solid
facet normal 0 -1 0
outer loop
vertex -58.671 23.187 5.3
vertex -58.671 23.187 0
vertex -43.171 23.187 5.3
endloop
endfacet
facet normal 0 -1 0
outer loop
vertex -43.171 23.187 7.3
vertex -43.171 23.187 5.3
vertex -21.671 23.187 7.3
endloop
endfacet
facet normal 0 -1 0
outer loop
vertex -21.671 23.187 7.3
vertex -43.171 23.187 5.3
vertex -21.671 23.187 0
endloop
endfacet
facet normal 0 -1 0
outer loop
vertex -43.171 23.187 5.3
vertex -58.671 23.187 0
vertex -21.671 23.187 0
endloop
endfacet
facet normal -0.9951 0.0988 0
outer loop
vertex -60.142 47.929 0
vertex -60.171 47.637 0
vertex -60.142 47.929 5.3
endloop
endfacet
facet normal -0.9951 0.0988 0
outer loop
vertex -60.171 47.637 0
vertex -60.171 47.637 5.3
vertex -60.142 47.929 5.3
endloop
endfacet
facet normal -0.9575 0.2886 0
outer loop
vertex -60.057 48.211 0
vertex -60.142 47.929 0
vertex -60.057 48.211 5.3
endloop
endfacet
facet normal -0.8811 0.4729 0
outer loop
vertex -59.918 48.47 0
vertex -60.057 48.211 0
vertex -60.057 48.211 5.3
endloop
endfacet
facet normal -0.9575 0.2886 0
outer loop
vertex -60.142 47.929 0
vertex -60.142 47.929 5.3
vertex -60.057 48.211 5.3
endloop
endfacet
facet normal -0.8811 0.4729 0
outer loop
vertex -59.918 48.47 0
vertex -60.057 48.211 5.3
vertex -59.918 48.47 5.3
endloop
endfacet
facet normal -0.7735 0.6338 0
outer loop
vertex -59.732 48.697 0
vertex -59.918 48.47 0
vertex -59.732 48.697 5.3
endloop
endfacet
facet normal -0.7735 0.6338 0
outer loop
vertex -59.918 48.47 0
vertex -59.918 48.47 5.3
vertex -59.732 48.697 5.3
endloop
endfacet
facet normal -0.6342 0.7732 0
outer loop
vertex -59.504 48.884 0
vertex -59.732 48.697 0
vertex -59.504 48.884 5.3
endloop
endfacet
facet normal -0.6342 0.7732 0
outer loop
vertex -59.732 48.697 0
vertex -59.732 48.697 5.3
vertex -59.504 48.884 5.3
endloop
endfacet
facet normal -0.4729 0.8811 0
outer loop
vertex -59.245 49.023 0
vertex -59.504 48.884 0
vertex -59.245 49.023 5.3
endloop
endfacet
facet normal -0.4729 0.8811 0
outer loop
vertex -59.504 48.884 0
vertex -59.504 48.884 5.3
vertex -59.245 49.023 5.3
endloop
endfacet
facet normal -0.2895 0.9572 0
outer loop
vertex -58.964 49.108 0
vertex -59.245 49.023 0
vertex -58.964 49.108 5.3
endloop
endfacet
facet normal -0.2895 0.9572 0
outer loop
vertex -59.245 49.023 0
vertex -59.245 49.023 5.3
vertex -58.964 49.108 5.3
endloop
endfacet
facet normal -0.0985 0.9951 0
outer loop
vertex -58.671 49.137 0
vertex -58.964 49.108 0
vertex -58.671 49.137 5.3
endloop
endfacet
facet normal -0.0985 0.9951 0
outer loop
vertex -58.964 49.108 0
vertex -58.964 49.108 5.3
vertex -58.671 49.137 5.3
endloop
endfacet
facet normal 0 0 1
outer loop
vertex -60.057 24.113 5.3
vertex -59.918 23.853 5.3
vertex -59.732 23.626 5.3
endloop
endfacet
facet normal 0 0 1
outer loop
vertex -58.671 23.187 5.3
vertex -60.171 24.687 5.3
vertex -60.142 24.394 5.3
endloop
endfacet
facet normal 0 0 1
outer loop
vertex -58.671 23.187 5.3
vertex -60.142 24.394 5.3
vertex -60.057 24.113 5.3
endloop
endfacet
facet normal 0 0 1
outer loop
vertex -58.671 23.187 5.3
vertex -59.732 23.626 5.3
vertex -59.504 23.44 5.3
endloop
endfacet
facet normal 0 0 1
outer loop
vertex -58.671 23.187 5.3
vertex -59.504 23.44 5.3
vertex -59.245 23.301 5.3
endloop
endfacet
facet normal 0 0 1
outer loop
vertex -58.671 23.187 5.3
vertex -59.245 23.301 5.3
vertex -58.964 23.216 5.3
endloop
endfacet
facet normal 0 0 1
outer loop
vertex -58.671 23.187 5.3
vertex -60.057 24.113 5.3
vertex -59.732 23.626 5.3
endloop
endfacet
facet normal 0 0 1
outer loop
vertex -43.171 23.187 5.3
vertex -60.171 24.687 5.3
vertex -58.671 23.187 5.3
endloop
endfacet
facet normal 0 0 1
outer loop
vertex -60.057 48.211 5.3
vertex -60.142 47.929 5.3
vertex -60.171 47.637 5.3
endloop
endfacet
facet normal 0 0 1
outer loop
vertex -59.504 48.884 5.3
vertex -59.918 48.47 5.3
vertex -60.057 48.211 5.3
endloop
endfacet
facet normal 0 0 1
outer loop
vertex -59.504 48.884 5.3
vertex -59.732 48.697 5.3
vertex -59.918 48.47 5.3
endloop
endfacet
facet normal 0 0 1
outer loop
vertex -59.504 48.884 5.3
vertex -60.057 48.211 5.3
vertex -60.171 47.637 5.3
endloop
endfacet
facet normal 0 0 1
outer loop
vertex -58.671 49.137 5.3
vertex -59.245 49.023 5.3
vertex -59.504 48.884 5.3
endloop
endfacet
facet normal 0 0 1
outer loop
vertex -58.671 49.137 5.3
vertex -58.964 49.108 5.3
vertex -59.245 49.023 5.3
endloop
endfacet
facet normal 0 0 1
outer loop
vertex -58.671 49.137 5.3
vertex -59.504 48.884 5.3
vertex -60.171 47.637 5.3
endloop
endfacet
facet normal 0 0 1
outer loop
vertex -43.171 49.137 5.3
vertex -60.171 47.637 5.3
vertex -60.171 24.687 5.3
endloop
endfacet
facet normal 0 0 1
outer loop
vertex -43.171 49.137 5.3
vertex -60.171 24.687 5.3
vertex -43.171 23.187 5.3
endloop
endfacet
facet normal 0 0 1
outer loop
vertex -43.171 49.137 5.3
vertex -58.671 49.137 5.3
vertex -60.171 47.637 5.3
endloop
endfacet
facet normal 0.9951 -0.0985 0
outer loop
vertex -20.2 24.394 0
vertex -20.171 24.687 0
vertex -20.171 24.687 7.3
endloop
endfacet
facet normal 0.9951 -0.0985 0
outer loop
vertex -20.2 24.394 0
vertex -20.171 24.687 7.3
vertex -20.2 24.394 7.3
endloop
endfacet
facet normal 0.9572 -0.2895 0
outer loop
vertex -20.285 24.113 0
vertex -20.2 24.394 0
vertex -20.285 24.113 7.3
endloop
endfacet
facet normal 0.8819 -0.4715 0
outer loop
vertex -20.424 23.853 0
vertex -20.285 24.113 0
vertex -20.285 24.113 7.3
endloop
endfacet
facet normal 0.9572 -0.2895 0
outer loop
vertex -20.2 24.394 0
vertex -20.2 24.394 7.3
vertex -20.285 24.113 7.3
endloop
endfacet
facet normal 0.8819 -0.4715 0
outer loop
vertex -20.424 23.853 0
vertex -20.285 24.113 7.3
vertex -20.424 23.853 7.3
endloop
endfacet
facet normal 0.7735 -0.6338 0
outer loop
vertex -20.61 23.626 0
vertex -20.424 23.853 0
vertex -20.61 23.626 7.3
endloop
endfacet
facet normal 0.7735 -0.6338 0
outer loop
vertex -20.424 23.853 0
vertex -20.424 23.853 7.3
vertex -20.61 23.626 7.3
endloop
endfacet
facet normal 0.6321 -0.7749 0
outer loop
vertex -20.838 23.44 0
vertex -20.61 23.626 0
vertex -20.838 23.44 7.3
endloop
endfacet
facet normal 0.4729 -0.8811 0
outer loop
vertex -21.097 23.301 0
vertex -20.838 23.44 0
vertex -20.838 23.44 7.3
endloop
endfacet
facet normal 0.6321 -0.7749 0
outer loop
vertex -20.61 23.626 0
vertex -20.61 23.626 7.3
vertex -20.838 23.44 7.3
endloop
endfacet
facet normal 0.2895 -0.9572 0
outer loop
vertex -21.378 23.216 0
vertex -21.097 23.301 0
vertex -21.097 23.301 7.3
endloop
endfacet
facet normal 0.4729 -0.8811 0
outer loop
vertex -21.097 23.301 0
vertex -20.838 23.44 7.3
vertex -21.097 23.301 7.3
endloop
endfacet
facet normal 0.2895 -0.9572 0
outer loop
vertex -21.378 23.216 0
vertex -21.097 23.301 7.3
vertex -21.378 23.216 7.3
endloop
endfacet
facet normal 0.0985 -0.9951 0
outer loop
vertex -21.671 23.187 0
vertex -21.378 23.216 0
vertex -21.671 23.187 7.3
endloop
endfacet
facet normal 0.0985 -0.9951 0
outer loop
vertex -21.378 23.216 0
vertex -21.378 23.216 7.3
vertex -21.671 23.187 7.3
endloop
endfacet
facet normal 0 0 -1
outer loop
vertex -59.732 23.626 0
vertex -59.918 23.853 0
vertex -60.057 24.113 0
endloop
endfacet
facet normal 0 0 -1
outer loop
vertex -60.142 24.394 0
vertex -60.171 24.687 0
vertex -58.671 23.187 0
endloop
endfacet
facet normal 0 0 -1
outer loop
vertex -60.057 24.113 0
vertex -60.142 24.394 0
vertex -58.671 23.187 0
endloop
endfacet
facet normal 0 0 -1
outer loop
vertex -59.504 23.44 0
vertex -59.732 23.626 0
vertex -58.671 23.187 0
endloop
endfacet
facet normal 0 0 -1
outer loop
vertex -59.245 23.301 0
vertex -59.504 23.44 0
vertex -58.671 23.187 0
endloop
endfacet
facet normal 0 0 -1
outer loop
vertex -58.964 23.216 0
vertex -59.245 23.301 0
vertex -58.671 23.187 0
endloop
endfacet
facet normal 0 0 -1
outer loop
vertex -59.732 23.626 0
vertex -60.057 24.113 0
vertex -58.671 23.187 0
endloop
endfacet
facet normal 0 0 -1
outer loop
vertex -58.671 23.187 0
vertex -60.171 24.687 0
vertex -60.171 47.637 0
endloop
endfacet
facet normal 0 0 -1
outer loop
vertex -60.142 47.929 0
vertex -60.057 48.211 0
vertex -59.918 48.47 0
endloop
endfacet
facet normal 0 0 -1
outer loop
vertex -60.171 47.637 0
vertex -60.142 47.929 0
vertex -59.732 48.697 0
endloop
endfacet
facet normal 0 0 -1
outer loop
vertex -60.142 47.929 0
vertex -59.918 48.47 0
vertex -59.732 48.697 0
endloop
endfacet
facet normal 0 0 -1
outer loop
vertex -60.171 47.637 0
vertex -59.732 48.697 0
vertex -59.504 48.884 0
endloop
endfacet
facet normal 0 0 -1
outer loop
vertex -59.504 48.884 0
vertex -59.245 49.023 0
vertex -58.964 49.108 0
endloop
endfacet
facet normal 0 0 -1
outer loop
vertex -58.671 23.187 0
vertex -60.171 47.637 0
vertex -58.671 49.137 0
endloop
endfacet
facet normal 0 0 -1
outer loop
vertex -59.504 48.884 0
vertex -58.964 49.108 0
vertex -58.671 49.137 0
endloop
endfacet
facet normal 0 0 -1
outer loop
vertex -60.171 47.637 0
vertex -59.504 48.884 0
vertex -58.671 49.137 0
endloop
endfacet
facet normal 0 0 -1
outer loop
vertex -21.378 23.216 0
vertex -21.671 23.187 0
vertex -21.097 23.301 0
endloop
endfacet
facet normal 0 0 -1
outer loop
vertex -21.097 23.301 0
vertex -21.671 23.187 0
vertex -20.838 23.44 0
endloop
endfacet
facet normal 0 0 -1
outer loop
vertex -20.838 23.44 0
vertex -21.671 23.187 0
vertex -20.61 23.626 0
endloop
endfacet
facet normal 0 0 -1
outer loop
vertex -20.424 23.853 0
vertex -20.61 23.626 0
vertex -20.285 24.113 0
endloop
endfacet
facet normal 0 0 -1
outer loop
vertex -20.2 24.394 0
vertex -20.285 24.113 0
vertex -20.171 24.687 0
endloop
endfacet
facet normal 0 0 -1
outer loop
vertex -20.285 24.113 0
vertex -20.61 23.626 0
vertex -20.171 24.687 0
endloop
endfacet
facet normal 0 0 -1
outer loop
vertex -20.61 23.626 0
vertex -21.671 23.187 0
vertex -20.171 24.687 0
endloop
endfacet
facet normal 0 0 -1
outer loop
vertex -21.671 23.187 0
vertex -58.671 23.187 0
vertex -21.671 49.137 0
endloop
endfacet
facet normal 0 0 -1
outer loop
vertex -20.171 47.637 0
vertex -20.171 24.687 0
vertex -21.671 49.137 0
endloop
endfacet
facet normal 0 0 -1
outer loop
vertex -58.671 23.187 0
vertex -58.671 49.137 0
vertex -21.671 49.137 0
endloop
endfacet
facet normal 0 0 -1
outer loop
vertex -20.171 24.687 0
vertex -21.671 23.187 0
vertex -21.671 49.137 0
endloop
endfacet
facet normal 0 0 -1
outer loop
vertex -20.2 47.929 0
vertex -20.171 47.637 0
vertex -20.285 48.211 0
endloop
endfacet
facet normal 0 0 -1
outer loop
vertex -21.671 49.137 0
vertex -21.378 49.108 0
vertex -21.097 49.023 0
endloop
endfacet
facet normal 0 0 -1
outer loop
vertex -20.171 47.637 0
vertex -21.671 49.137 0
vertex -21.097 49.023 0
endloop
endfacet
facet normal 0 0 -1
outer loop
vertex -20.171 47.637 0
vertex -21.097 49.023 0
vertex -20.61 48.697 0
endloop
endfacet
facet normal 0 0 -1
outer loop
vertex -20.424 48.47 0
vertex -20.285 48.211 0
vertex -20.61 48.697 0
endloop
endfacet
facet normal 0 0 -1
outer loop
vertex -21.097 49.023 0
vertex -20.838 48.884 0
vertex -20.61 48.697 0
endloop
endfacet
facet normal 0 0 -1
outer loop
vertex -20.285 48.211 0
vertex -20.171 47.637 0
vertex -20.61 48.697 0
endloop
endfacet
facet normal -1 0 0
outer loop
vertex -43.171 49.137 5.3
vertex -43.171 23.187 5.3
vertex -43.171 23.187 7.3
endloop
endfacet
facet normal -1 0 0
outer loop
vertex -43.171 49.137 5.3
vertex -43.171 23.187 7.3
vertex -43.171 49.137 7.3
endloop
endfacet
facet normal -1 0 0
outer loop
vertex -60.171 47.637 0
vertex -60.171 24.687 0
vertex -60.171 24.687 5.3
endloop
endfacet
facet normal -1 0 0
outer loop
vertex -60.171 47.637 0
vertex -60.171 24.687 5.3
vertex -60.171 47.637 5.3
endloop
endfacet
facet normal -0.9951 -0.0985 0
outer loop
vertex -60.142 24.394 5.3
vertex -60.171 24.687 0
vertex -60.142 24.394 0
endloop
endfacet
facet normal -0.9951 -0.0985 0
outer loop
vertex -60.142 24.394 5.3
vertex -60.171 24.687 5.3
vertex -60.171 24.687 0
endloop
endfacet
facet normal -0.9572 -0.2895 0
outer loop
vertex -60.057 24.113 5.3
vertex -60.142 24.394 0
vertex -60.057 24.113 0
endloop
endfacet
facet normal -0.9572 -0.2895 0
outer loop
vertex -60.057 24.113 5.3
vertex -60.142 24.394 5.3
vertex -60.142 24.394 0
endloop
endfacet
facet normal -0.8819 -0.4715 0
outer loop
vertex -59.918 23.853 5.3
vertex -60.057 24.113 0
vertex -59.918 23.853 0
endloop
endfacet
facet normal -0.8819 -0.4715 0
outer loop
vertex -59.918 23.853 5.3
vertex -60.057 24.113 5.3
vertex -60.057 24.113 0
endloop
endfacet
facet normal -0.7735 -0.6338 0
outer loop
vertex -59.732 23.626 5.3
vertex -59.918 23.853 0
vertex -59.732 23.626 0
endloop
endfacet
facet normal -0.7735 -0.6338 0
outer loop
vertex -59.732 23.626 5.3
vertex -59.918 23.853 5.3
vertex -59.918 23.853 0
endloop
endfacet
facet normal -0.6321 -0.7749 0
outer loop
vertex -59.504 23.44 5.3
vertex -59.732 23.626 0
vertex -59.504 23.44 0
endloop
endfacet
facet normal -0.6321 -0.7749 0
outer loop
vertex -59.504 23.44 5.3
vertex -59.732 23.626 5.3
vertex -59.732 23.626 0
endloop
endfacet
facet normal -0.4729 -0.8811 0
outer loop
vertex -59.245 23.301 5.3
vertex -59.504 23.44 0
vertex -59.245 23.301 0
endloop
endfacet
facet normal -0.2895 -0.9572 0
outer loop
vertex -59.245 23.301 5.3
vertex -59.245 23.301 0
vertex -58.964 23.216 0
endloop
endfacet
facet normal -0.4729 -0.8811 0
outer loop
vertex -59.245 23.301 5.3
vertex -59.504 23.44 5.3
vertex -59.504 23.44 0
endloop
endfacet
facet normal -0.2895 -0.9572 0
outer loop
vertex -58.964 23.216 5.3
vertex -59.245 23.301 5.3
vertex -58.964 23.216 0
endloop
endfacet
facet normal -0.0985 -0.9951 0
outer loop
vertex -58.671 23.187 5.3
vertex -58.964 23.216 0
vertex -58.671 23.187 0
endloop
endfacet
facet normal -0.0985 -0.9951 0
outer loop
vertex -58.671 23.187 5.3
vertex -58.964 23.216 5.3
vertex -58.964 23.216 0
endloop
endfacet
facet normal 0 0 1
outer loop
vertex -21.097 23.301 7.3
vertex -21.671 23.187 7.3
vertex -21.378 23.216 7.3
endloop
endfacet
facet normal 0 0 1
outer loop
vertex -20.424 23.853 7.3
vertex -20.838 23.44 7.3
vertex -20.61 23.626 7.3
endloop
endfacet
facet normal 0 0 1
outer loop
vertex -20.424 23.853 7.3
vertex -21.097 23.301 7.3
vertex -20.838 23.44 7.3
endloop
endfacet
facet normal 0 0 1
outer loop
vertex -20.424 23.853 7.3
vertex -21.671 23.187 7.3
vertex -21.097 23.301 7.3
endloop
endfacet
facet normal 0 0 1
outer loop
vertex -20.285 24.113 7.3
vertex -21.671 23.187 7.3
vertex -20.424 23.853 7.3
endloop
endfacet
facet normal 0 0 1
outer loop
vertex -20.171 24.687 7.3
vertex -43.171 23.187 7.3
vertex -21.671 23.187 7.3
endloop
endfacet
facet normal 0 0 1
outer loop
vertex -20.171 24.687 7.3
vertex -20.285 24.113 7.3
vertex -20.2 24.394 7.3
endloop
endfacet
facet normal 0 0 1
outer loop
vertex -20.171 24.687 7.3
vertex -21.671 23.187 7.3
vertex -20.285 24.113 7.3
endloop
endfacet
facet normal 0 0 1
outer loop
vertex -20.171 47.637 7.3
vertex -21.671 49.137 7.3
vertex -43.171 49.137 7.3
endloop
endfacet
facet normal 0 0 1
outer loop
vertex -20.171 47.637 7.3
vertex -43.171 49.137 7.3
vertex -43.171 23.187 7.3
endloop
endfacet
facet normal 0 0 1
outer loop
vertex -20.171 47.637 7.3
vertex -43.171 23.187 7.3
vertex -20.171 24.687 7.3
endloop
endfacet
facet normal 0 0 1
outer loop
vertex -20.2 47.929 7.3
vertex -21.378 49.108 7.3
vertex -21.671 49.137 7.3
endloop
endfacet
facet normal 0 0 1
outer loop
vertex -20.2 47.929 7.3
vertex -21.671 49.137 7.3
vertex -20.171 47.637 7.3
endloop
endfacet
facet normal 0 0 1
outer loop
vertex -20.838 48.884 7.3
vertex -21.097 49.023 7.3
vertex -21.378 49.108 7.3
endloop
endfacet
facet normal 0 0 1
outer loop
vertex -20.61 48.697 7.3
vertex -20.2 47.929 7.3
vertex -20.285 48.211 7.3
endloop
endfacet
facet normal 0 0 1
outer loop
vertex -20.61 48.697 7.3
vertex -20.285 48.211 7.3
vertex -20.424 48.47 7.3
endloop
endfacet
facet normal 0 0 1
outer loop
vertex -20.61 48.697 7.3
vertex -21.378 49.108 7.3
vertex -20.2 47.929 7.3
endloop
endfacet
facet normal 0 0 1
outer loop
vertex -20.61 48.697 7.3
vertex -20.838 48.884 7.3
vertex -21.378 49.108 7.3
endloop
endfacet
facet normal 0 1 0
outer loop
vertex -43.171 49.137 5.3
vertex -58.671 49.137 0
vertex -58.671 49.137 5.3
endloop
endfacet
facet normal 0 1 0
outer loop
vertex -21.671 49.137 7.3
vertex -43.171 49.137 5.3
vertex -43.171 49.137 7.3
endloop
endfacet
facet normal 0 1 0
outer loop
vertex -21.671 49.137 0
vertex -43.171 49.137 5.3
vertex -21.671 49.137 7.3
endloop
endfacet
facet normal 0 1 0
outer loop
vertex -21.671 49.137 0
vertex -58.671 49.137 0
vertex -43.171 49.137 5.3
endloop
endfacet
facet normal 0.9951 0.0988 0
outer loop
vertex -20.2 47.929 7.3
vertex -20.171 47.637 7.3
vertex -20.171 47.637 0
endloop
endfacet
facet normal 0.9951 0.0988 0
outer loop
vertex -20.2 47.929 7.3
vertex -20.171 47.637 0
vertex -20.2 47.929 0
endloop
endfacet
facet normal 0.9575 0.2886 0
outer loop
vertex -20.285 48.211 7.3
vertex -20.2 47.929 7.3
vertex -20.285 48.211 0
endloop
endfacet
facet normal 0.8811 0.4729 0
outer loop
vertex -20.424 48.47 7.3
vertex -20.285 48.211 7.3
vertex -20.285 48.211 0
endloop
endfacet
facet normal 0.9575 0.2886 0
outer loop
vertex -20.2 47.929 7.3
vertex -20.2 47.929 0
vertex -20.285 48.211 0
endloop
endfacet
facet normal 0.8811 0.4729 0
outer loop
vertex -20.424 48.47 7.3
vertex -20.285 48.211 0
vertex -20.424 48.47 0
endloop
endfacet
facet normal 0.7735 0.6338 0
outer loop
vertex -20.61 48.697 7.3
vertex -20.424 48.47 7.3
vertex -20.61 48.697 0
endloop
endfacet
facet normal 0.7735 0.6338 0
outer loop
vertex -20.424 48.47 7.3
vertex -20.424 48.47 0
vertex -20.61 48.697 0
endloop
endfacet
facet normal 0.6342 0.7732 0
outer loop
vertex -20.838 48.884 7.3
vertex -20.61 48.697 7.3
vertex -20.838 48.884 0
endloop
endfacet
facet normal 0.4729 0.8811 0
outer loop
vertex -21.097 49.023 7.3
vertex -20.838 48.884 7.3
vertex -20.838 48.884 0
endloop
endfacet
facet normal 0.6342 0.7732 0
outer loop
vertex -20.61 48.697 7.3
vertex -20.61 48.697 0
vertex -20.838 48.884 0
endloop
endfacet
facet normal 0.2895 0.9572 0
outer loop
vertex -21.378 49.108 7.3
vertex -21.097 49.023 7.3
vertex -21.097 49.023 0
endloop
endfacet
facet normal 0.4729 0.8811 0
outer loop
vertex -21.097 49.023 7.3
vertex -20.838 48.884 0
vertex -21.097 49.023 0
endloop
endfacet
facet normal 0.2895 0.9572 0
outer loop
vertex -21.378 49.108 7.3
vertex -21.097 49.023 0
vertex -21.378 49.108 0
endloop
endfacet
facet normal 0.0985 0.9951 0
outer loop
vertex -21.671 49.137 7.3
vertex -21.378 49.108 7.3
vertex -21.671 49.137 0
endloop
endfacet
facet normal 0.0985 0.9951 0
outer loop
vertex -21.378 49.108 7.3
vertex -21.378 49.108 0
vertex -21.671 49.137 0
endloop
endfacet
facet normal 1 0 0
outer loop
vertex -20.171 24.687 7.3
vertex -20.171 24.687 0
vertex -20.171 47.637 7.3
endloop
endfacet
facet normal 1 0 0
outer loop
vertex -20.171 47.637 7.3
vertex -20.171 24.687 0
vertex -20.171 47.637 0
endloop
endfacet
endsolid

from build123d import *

# Parameters (mm, degrees)
F0_W     = 40
F0_H     = 25.95
F1_DEPTH = 5.3
F2_W     = 23
F2_H     = 25.95
F3_DEPTH = 2
F4_R     = 1.5


with BuildPart() as f1:
    # F0 (on Top) → F1 (new body)
    with BuildSketch(Plane.XY):
        with Locations((-40.170929, 36.161726)):
            Rectangle(F0_W, F0_H)
    extrude(amount=F1_DEPTH)

    # F2 (on face) → F3 (join)
    with BuildSketch(Plane.XY.offset(5.3)):
        with Locations((-31.670929, 36.161726)):
            Rectangle(F2_W, F2_H)
    extrude(amount=F3_DEPTH)

    # F4
    f4_edges = [f1.edges().sort_by_distance(p)[0] for p in [
        (-20.170929, 23.186726, 3.65),
        (-20.170929, 49.136726, 3.65),
        (-60.170929, 23.186726, 2.65),
        (-60.170929, 49.136726, 2.65),
    ]]
    fillet(f4_edges, radius=F4_R)


solid = f1.part
